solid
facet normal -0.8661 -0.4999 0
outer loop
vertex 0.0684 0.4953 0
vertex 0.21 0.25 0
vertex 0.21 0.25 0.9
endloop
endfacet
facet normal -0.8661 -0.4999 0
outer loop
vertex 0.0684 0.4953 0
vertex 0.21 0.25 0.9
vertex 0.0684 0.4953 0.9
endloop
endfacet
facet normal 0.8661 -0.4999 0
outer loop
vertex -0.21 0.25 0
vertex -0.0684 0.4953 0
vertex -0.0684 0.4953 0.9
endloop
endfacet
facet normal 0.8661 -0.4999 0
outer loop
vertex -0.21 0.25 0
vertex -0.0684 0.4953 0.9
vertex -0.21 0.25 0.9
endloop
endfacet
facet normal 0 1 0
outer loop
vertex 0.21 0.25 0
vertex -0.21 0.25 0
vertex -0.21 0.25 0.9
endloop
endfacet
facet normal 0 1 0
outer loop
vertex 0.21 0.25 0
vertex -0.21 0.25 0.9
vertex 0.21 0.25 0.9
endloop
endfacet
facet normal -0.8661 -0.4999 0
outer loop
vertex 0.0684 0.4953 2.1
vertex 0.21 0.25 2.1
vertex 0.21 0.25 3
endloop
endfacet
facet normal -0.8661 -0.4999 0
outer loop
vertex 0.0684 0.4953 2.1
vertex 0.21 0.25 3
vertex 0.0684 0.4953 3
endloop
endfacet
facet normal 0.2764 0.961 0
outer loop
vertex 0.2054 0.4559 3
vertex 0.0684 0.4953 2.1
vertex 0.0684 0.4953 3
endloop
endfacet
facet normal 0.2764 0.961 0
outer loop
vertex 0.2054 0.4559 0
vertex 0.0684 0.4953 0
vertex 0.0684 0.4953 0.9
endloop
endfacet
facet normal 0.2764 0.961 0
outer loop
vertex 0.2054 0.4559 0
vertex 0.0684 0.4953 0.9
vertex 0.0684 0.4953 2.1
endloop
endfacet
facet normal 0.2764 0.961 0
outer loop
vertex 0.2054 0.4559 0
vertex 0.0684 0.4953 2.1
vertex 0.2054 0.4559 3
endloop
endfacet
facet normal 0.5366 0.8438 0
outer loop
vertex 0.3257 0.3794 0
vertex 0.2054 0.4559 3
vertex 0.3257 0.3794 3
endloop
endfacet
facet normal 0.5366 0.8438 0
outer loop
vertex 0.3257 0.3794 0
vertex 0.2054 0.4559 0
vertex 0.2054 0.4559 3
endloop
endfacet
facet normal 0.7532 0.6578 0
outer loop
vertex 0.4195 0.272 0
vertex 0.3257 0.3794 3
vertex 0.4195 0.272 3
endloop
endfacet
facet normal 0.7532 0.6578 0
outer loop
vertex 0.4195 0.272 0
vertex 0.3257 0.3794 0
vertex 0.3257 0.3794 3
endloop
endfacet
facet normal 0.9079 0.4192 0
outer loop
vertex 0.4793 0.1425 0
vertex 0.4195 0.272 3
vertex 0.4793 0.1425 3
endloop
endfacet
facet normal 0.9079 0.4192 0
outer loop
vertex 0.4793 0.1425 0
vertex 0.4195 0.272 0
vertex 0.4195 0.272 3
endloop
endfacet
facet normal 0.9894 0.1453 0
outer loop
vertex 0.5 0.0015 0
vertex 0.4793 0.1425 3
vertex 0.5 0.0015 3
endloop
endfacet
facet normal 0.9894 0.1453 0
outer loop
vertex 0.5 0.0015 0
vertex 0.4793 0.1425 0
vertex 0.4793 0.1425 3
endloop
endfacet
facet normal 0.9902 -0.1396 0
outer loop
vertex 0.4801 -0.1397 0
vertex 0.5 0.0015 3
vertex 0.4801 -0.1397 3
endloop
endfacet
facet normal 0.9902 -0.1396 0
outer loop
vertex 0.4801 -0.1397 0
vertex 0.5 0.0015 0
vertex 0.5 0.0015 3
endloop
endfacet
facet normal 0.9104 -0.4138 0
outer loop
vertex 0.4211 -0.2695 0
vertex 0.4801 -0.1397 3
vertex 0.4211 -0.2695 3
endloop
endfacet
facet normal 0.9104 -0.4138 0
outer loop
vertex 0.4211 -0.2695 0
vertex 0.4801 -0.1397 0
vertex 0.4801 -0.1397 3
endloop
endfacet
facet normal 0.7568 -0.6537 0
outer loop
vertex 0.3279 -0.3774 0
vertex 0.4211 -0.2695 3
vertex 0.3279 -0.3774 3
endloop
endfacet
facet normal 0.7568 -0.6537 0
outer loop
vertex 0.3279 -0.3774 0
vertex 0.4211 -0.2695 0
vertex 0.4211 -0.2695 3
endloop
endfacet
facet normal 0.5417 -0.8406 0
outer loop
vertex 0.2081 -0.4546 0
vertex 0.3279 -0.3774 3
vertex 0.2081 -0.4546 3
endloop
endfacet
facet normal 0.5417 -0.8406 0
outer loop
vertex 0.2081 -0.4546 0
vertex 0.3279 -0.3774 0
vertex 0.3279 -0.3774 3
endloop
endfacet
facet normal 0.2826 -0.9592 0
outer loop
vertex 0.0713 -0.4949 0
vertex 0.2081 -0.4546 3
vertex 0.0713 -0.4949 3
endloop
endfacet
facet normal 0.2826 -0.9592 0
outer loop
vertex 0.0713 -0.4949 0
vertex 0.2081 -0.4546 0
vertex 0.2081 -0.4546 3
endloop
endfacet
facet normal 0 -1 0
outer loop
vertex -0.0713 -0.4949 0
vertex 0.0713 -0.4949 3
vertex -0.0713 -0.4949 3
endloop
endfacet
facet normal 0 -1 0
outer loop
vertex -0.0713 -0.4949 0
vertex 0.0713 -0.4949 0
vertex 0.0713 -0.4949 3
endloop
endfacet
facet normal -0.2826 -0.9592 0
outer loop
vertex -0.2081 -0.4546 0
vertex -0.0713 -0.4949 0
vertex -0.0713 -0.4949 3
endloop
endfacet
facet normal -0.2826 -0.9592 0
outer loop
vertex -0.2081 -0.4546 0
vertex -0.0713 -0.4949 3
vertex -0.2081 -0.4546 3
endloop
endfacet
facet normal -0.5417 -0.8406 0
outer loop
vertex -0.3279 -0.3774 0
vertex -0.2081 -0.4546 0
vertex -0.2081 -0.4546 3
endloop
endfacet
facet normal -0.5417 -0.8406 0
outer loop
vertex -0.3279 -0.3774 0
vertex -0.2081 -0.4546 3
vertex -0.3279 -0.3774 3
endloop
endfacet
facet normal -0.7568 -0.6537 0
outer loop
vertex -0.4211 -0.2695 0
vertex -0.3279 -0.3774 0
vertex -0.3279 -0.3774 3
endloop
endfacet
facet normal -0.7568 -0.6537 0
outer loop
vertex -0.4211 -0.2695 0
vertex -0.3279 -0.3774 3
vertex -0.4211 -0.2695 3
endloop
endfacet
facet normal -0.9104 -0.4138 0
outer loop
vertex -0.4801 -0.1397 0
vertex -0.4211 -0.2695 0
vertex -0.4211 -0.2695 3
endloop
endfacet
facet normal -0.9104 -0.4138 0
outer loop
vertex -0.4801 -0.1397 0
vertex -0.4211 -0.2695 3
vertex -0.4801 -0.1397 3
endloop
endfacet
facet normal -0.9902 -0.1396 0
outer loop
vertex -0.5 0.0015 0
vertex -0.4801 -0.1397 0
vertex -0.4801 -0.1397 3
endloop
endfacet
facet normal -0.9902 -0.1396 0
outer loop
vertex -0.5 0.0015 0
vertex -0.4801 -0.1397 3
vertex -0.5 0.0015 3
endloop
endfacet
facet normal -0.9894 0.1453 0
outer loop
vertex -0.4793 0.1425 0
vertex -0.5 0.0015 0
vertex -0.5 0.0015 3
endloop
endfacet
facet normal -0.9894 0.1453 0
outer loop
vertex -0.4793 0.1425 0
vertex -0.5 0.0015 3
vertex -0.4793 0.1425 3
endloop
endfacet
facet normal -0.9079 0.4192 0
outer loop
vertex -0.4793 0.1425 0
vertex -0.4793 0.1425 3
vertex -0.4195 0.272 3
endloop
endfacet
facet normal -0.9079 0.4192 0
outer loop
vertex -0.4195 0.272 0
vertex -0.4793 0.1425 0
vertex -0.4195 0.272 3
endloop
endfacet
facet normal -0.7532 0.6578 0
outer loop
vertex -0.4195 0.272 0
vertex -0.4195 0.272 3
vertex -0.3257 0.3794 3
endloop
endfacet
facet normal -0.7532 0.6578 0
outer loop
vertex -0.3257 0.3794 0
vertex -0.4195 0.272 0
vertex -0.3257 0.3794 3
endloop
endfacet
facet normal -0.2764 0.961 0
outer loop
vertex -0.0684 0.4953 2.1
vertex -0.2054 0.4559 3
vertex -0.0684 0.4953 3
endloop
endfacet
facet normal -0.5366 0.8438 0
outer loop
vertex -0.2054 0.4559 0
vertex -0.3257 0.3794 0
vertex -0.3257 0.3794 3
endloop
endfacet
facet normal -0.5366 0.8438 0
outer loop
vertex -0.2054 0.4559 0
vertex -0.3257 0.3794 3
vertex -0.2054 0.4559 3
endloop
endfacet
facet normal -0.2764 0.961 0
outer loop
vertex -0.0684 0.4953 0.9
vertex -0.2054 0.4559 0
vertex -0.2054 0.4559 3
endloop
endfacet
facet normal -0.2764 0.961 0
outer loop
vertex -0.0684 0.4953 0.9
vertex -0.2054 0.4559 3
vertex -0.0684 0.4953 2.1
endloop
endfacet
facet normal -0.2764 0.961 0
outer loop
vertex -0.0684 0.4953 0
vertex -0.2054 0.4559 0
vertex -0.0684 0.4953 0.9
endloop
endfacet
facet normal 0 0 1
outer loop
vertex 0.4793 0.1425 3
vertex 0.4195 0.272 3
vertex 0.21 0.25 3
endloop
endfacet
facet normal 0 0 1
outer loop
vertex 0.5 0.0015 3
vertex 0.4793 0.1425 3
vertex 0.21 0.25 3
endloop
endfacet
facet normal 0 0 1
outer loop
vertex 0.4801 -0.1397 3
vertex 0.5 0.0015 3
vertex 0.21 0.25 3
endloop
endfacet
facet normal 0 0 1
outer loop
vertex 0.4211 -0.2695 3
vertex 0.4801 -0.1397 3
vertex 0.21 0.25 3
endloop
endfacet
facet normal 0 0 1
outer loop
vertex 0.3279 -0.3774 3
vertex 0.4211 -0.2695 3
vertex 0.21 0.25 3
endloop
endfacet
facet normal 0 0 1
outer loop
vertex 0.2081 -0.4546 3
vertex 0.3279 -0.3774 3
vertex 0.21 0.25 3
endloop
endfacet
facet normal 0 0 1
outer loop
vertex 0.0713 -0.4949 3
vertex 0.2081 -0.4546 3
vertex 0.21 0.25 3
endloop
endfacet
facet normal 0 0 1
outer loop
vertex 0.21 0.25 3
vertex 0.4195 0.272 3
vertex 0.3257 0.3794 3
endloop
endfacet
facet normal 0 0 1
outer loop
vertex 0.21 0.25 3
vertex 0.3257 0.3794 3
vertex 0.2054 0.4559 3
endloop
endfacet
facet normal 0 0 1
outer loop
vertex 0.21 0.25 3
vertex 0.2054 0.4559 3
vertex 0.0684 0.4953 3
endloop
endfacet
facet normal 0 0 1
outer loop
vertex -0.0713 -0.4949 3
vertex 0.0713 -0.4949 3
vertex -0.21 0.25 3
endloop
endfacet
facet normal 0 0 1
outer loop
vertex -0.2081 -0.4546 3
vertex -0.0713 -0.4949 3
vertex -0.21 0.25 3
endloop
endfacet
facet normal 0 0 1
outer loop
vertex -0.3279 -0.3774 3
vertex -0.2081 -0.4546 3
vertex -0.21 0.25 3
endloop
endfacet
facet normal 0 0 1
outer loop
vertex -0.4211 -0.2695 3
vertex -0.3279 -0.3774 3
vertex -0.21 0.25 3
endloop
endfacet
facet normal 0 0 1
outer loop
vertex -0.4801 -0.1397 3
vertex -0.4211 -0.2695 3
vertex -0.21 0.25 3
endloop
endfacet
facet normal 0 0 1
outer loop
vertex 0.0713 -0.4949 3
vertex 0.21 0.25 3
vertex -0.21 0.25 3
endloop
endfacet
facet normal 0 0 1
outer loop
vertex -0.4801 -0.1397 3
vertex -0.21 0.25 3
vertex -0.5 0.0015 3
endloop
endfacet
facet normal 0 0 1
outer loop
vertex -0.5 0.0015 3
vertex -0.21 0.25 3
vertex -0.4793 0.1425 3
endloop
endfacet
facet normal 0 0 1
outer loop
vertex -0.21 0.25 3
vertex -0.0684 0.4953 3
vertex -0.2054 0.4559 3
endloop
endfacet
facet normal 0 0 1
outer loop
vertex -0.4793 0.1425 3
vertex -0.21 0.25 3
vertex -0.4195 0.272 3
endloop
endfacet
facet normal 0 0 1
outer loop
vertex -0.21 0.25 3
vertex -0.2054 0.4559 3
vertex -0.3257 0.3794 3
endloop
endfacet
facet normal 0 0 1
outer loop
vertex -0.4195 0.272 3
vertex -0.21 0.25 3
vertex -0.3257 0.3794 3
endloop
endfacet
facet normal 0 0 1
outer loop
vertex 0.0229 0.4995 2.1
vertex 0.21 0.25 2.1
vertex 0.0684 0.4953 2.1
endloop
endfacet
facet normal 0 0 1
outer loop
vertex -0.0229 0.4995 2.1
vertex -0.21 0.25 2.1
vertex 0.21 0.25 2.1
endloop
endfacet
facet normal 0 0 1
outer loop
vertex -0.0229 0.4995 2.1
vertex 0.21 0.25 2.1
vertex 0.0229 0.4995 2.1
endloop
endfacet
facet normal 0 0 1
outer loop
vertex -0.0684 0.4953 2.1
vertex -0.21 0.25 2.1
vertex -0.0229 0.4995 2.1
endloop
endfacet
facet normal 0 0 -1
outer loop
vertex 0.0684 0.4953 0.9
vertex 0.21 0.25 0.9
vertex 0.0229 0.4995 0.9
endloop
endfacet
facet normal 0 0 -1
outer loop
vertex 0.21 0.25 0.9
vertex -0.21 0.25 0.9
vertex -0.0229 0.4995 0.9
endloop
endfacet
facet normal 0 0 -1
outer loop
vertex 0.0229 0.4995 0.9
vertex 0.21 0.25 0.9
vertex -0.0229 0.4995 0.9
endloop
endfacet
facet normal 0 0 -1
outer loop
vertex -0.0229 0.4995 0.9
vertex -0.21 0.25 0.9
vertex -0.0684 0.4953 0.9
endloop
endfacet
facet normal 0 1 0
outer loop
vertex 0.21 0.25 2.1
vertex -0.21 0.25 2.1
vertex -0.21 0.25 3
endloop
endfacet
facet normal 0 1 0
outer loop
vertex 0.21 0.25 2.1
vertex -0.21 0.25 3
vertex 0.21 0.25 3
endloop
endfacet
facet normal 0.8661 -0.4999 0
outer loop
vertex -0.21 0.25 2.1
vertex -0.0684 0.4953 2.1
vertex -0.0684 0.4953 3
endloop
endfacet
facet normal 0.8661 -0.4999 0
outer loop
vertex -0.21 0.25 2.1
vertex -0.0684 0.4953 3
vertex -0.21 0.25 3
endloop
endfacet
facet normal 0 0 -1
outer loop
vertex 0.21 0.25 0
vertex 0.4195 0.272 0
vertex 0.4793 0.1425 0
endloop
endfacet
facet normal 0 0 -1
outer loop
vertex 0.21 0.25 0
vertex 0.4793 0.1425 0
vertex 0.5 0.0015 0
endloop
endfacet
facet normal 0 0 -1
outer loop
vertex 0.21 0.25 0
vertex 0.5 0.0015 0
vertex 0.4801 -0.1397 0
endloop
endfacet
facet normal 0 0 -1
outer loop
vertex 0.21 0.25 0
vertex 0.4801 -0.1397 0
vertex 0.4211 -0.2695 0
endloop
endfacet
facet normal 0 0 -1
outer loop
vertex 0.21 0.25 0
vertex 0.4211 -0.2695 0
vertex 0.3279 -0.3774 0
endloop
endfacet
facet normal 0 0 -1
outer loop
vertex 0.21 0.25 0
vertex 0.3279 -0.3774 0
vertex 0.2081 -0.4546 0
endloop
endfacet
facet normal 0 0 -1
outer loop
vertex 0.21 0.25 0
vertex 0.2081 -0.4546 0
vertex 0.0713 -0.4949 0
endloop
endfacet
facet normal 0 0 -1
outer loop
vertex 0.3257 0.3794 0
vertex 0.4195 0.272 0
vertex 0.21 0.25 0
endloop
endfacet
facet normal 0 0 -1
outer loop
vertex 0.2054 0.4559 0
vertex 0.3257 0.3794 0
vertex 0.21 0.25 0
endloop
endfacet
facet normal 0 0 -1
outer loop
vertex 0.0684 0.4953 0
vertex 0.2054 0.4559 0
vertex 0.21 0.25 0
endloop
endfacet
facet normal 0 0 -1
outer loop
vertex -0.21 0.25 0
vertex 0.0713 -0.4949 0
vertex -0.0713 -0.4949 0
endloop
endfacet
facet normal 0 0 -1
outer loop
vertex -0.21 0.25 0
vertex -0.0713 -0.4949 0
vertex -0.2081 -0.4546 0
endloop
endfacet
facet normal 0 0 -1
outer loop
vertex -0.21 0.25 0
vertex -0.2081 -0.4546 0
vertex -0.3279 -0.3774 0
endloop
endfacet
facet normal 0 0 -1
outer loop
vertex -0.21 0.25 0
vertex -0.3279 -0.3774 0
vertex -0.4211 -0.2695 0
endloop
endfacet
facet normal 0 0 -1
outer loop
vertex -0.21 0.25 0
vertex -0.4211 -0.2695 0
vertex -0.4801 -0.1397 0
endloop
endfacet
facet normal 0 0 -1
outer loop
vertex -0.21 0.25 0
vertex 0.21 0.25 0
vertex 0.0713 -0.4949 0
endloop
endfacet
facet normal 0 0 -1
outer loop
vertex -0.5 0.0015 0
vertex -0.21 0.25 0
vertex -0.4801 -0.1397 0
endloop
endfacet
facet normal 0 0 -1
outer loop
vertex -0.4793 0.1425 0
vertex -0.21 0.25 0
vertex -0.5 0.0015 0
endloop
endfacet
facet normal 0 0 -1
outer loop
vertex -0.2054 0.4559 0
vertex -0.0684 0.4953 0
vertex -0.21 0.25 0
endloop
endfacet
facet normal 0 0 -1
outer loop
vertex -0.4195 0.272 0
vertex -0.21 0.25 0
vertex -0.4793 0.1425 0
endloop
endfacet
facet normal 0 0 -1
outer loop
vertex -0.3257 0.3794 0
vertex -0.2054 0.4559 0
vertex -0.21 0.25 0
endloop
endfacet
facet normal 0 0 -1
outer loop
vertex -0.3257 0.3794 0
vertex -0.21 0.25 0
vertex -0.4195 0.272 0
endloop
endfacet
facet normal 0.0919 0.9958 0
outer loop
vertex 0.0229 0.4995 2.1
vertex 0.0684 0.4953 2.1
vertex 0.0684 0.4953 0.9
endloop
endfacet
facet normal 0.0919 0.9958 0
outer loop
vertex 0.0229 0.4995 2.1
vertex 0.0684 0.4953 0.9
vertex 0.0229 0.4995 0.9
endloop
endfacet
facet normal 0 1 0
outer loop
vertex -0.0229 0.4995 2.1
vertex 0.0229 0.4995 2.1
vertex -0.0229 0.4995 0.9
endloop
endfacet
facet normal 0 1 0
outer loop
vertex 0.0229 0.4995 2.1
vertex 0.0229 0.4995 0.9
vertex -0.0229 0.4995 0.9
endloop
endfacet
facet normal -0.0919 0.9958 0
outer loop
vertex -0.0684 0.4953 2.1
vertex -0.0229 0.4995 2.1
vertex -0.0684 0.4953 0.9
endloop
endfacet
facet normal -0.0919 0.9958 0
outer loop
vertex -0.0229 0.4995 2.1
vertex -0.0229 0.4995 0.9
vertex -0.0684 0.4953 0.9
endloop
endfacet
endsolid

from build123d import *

# Parameters (mm, degrees)
BOSS_EXTRUDE1_DEPTH = 3
BOSS_EXTRUDE2_START = 0.9
SKETCH1_7_R         = 0.5
BOSS_EXTRUDE2_DEPTH = 1.2


with BuildPart() as part:
    # Sketch1 → Boss-Extrude1 (new body)
    with BuildSketch(Plane.XY):
        with BuildLine():
            Line((0.21, 0.25), (0, 0.25))
            Line((0, 0.25), (-0.21, 0.25))
            Line((-0.21, 0.25), (-0.06837431, 0.495302891))
            ThreePointArc((-0.06837431, 0.495302891), (-0.32849113, -0.376953018), (0.5, 0))
            ThreePointArc((0.5, 0), (0.376953018, 0.32849113), (0.06837431, 0.495302891))
            Line((0.06837431, 0.495302891), (0.21, 0.25))
        make_face()
    extrude(amount=BOSS_EXTRUDE1_DEPTH)

    # Sketch1<7> → Boss-Extrude2 (add)
    with BuildSketch(Plane.XY.offset(BOSS_EXTRUDE2_START)):
        Circle(SKETCH1_7_R)
    extrude(amount=BOSS_EXTRUDE2_DEPTH)


solid = part.part
